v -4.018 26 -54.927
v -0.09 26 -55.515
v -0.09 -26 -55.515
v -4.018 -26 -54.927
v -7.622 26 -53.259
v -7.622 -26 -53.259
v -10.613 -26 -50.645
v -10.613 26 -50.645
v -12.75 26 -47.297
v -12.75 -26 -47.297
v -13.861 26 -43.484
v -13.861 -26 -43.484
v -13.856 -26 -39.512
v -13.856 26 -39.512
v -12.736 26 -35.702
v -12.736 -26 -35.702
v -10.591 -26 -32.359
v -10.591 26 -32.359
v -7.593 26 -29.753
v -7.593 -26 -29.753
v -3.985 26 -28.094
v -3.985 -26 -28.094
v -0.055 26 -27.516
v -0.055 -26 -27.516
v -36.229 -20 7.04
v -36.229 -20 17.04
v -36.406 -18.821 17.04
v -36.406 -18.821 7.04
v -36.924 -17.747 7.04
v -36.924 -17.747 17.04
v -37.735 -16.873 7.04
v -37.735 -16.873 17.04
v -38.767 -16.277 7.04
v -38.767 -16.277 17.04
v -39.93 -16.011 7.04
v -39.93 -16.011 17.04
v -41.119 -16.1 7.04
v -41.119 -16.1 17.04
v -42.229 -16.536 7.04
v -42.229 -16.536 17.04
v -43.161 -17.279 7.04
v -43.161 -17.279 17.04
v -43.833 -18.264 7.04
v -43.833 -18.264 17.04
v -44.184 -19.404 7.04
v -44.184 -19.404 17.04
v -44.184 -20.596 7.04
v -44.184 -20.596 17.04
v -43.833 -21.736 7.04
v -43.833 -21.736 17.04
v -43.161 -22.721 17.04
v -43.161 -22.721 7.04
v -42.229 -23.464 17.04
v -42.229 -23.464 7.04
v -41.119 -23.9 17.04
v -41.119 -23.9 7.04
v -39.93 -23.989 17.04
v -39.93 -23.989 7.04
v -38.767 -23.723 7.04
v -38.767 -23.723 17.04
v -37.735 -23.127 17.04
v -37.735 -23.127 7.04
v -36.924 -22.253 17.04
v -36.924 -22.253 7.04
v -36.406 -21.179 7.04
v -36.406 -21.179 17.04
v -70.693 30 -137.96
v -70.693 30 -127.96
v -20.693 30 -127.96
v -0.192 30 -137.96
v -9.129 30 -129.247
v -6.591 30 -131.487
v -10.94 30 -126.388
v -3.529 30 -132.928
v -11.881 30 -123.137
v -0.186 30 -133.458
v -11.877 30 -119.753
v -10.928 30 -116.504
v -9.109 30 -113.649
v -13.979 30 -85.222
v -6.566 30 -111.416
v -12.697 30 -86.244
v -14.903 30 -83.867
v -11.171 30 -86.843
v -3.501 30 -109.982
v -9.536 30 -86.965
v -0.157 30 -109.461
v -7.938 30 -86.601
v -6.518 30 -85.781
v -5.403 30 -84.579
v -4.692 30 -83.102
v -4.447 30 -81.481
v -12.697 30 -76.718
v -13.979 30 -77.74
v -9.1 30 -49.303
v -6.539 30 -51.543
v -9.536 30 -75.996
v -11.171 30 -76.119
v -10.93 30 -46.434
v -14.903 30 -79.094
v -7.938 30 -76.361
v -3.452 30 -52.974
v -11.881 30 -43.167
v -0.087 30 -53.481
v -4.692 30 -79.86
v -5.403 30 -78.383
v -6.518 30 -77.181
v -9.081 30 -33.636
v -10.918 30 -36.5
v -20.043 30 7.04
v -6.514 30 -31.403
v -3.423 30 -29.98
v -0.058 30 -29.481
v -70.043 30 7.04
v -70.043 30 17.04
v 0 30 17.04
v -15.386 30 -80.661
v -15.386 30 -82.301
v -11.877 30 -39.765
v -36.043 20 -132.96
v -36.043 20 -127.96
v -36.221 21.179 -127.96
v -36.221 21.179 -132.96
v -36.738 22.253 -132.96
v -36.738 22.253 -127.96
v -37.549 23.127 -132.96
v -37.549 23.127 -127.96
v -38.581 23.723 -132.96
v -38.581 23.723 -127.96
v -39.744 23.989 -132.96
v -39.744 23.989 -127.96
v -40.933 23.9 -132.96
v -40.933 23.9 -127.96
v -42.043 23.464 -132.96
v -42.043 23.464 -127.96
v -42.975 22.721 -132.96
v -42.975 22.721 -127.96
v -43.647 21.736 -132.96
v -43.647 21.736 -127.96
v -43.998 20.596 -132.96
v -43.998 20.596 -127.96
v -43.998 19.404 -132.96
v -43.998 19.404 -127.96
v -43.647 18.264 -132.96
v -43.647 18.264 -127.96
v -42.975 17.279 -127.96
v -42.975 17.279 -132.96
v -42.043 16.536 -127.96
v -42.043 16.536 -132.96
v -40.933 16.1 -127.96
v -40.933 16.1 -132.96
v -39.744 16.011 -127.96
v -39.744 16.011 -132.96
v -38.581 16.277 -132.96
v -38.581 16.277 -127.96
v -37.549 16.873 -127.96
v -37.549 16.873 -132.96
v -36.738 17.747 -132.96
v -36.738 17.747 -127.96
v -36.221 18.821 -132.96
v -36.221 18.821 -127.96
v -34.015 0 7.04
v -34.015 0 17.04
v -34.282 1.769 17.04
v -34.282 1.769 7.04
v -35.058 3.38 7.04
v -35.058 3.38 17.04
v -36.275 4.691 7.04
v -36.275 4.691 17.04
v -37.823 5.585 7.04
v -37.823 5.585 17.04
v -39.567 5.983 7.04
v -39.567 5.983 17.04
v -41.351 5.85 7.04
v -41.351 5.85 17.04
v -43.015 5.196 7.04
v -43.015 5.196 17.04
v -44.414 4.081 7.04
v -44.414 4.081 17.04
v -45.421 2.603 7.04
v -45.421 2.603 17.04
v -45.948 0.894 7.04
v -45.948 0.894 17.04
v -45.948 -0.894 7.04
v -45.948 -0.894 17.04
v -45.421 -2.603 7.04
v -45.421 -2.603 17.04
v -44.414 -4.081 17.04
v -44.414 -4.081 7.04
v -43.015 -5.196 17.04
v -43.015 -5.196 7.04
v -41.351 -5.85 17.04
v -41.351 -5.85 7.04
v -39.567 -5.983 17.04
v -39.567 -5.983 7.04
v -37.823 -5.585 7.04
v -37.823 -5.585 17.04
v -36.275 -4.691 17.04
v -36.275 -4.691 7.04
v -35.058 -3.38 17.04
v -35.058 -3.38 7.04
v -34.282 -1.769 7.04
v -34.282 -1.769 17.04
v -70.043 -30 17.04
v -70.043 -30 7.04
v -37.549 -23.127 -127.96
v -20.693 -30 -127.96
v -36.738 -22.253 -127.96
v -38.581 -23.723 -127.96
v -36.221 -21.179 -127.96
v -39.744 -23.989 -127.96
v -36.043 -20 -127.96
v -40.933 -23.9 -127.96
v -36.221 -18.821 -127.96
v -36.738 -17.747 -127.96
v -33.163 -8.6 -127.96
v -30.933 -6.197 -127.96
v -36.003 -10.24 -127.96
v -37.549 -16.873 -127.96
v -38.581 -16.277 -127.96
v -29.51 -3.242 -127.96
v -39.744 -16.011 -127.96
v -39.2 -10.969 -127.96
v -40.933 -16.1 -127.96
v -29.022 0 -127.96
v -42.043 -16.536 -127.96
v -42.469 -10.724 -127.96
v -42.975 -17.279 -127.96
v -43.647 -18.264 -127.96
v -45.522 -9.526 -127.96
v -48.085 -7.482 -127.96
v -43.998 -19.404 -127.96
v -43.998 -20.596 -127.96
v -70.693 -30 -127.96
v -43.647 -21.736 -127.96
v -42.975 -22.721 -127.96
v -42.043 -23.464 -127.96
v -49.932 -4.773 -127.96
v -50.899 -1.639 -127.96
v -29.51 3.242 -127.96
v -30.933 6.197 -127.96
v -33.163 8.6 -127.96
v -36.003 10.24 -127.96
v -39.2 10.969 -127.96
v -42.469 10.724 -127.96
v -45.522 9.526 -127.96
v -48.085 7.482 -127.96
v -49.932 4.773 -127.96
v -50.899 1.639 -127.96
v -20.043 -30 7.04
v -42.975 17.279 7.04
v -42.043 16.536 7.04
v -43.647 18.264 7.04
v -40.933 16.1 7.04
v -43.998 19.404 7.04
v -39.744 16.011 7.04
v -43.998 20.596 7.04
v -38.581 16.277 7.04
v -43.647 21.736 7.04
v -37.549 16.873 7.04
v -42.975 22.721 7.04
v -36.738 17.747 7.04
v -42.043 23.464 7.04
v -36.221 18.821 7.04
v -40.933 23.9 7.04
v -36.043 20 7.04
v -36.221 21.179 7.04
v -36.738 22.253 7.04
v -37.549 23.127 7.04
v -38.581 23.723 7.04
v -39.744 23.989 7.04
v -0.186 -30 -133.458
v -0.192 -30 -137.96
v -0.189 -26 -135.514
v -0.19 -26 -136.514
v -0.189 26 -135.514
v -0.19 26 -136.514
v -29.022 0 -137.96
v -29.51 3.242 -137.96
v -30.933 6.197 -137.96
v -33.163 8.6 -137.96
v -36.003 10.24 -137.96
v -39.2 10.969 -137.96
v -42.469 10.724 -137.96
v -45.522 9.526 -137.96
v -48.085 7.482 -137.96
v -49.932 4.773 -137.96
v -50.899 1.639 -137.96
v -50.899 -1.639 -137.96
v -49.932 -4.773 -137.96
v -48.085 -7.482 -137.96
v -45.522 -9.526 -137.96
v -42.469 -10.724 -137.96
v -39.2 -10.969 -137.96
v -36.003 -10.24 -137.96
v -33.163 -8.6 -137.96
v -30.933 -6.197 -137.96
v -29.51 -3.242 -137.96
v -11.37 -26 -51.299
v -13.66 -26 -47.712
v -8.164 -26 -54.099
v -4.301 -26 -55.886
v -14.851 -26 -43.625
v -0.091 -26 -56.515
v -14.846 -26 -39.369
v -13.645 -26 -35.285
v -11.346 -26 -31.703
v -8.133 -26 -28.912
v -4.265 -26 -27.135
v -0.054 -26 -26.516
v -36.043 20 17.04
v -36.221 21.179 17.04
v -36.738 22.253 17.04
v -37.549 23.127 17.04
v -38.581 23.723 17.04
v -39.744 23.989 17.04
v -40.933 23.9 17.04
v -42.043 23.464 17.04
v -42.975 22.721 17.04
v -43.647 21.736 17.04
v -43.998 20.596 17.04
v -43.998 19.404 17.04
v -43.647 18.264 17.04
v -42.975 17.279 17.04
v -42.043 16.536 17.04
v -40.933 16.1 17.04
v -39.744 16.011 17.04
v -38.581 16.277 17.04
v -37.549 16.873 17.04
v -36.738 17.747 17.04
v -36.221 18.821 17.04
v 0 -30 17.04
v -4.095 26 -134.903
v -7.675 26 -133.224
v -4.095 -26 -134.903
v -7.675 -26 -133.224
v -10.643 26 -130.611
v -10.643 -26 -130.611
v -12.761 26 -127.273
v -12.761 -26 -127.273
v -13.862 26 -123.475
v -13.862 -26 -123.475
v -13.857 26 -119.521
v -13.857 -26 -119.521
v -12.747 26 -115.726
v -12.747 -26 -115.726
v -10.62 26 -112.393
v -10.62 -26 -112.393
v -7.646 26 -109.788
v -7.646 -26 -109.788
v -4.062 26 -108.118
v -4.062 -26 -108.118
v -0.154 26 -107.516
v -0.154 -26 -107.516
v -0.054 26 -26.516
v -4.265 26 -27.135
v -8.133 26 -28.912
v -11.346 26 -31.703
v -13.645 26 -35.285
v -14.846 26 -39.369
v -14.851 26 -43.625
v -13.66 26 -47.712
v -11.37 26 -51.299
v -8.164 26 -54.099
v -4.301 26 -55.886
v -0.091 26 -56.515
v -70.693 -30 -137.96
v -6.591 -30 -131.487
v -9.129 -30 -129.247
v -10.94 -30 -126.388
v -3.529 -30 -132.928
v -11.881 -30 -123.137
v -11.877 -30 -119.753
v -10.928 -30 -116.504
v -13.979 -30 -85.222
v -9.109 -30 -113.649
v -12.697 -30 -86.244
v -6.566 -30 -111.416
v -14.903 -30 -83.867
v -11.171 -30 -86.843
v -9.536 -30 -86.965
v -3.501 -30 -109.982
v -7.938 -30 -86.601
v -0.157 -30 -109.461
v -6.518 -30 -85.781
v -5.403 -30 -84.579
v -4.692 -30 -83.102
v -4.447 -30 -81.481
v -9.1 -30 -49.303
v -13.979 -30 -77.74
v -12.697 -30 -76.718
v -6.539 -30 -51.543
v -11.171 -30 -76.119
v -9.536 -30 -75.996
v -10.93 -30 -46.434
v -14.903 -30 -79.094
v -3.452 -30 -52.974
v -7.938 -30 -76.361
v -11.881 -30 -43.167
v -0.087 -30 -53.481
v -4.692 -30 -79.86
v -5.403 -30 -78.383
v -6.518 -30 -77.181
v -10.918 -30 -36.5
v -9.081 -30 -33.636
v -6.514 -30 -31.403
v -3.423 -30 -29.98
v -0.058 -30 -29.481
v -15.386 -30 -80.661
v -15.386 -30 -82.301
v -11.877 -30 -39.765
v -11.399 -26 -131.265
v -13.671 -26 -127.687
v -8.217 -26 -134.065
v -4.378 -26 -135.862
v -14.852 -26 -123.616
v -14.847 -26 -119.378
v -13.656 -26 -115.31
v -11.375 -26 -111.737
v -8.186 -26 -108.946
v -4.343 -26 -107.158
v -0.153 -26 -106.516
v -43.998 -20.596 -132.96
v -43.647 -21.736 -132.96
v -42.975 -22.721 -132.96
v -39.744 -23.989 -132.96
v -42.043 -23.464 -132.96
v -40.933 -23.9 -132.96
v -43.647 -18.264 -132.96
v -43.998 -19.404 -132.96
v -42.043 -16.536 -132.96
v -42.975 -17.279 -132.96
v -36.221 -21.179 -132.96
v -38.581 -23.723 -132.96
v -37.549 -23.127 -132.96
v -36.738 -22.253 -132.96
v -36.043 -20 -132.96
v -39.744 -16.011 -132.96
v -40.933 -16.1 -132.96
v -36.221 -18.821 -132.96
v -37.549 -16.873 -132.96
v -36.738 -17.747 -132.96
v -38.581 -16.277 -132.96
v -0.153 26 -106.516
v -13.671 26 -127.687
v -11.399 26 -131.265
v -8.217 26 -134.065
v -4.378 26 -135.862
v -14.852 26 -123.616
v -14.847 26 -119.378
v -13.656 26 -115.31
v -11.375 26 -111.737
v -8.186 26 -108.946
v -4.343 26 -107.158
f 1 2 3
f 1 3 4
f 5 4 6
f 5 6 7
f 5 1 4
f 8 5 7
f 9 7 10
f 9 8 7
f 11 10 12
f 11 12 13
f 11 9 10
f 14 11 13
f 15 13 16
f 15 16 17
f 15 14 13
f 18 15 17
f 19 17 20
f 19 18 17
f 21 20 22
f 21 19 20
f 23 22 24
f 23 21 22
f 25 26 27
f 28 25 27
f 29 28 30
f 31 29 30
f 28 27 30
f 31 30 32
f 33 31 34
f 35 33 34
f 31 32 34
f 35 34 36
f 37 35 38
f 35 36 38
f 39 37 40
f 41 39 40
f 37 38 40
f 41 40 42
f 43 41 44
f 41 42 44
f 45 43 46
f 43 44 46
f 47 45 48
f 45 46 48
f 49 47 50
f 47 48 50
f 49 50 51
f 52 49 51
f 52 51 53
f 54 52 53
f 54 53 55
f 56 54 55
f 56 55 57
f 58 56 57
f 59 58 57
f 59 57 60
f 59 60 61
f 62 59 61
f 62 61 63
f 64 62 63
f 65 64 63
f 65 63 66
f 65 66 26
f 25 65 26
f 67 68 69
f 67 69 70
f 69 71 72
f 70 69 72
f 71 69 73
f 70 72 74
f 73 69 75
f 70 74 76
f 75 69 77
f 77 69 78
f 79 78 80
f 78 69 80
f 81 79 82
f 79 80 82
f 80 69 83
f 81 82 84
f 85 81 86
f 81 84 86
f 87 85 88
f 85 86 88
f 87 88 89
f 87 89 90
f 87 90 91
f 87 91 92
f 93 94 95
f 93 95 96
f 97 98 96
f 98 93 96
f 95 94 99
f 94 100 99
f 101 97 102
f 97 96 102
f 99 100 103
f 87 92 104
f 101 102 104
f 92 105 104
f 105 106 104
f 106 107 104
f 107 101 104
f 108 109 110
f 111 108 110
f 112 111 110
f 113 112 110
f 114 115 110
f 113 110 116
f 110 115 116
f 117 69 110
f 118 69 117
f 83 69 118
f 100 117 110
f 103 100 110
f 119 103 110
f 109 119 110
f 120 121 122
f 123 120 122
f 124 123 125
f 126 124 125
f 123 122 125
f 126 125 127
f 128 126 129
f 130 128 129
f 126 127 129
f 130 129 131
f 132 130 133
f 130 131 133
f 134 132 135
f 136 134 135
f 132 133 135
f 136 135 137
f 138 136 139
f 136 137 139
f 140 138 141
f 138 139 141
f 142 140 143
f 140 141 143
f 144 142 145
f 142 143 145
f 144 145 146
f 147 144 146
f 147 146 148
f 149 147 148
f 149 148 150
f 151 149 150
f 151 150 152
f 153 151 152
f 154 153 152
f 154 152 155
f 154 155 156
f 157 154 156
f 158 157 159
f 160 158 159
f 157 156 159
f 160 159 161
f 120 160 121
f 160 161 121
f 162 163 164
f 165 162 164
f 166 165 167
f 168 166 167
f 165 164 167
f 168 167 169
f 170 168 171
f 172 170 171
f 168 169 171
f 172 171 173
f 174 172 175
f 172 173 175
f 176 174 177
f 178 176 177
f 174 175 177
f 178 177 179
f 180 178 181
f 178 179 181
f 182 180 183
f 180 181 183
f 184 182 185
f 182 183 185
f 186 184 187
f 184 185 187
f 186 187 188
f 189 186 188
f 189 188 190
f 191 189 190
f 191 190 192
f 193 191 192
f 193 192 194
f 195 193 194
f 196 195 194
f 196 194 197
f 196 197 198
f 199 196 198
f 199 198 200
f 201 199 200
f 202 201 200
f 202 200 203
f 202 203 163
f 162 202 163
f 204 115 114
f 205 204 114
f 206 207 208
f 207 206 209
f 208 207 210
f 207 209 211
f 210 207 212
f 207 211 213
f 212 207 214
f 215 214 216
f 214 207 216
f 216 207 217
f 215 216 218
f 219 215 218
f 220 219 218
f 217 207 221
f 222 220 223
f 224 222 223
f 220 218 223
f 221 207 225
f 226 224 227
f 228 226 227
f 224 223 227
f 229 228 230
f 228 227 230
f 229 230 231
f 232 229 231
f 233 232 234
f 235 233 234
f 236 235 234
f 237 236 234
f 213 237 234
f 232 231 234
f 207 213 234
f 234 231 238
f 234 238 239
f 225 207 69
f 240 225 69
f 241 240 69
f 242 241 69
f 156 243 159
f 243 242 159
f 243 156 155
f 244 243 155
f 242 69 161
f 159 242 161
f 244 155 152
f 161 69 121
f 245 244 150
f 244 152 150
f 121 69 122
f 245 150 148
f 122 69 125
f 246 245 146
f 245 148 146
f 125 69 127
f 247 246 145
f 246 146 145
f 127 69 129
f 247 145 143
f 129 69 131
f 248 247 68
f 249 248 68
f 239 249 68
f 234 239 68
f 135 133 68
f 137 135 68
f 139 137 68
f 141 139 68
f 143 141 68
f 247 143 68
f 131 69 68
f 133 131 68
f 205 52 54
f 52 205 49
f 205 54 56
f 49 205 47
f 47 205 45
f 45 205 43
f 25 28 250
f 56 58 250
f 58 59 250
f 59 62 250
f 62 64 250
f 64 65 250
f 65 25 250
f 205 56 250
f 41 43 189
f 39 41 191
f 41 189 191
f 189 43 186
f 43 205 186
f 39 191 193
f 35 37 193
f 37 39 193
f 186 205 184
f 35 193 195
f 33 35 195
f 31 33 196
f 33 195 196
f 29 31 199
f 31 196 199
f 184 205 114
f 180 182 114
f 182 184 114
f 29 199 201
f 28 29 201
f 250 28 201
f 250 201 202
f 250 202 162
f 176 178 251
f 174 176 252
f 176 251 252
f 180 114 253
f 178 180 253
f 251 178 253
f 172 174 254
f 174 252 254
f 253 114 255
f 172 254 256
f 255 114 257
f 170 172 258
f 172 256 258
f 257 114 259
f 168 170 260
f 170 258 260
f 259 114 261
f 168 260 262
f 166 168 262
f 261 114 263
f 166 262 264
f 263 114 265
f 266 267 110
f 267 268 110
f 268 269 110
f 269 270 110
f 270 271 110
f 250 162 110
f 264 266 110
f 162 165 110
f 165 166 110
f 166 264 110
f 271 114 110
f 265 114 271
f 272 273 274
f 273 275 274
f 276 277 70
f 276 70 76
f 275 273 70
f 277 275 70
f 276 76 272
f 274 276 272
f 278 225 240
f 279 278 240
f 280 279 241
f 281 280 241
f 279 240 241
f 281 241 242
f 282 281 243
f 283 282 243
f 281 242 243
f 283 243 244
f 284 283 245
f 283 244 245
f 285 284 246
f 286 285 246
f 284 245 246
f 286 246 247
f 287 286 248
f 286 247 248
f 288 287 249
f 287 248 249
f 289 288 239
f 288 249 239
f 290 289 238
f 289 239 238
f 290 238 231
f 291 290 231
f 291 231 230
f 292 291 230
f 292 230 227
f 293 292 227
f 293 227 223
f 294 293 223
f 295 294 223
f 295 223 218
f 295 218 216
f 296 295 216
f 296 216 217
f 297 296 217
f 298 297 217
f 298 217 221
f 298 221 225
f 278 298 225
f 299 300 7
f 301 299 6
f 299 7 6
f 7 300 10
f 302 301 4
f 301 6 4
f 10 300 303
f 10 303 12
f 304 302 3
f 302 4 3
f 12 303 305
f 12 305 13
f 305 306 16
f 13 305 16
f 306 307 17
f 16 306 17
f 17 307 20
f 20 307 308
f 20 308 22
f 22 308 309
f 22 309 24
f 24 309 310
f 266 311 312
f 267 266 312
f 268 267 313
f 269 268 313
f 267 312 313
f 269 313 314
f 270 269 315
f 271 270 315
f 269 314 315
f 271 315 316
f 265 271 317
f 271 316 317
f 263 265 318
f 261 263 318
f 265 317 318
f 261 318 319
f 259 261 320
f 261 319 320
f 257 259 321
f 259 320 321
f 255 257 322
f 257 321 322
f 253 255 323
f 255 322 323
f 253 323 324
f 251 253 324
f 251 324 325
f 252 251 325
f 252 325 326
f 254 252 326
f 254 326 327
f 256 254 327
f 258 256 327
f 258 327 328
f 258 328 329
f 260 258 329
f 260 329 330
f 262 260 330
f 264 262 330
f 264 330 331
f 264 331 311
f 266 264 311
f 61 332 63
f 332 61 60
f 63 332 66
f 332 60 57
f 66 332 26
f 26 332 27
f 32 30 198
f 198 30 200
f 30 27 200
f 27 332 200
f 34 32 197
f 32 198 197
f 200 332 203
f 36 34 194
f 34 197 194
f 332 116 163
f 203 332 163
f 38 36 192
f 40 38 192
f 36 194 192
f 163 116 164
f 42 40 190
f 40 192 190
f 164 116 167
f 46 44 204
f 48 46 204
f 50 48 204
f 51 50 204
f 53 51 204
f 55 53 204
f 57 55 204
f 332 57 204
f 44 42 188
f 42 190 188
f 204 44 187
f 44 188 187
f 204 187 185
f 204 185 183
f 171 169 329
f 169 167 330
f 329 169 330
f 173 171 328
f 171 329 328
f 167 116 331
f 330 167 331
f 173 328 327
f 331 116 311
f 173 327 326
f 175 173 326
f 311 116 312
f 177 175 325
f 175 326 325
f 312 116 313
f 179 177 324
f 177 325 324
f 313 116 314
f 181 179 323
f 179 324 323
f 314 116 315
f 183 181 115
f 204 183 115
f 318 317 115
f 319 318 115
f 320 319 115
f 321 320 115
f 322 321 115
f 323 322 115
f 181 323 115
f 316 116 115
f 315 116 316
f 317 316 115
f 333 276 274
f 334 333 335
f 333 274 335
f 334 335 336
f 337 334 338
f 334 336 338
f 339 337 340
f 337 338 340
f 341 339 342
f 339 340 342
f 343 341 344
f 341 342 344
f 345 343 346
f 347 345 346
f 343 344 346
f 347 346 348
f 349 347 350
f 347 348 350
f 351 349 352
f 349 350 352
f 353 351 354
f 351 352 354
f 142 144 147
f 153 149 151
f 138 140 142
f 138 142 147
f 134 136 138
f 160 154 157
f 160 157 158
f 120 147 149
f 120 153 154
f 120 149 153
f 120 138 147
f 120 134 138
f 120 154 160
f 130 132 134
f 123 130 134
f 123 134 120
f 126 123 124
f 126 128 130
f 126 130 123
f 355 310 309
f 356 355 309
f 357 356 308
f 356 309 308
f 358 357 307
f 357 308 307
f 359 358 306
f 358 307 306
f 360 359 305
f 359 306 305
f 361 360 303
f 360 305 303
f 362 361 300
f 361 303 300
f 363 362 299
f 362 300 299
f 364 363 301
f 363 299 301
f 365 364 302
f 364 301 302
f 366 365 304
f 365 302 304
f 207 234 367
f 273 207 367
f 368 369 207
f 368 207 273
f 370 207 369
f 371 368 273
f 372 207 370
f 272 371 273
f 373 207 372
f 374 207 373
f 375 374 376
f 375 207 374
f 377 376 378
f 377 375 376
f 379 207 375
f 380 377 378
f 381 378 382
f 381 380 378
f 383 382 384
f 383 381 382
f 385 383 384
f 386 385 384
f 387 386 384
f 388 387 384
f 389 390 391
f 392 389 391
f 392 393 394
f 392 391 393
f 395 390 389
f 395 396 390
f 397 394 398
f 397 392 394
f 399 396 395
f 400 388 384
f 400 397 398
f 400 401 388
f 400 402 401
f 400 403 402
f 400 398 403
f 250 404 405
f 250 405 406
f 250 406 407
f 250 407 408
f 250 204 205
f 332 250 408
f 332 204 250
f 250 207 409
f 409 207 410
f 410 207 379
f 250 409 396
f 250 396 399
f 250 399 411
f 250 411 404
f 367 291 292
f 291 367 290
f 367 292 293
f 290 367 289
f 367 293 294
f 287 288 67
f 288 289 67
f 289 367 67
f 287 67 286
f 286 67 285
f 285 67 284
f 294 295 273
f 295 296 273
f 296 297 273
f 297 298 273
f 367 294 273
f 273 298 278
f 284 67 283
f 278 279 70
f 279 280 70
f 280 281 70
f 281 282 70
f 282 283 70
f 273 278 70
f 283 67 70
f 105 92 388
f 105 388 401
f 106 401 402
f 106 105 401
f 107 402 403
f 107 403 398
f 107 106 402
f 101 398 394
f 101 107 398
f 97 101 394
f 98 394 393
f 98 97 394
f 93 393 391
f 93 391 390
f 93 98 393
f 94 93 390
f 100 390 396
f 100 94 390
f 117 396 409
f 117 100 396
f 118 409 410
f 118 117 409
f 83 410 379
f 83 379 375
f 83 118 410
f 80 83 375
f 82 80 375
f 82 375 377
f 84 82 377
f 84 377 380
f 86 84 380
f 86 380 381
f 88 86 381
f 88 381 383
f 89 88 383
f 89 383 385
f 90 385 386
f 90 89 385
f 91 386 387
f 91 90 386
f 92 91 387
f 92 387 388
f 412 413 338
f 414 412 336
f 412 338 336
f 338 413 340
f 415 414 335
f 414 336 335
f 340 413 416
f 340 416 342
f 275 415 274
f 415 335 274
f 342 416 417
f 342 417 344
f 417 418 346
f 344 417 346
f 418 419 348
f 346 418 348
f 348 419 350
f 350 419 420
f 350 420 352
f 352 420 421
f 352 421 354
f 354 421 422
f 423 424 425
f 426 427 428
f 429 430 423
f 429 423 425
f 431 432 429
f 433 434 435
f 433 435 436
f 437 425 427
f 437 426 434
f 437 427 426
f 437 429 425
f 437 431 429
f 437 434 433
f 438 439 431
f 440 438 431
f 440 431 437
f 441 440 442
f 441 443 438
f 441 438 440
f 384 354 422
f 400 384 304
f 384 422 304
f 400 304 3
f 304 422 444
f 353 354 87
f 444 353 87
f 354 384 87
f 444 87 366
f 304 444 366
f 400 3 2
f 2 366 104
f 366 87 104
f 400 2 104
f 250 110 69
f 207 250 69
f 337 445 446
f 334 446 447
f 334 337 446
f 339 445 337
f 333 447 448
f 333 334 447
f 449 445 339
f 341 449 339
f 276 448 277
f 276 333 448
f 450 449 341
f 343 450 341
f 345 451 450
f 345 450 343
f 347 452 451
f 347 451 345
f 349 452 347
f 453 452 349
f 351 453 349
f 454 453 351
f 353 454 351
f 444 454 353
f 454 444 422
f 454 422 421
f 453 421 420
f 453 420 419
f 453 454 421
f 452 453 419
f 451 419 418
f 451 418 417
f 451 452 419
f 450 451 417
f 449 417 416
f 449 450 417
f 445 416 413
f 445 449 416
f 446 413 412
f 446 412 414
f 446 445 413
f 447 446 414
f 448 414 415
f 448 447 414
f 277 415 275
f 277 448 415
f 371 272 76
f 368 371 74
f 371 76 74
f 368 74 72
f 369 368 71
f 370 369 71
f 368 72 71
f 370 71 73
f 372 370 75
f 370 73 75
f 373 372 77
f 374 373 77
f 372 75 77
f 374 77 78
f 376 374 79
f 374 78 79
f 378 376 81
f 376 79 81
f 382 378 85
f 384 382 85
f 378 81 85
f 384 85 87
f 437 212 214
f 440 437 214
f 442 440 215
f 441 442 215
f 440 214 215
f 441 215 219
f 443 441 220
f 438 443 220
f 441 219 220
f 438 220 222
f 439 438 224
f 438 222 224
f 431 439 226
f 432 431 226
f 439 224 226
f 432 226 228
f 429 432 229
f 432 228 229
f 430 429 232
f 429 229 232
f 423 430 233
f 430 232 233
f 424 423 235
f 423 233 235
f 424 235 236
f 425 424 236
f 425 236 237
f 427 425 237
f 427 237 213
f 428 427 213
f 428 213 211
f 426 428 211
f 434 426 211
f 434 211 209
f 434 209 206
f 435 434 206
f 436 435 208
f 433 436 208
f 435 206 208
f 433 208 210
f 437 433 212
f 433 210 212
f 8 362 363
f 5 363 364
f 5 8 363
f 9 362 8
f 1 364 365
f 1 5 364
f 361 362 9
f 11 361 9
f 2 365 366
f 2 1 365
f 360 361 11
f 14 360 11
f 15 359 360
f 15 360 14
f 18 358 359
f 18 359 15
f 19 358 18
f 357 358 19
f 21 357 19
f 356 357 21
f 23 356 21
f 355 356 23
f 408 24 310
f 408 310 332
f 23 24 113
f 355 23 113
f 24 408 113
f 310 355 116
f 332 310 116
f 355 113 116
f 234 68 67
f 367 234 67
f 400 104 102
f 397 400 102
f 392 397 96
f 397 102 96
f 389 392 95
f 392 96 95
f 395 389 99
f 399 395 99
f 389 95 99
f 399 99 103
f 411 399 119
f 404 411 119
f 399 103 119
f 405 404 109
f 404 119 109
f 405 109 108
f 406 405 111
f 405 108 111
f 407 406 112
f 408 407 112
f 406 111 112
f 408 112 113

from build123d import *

# Parameters (mm, degrees)
F0_R          = 5.5
F1_DEPTH      = 60
F4_DEPTH      = 26
F4_DEPTH_BACK = 26
F5_R          = 4
F6_DEPTH      = 5
F7_R          = 4
F8_DEPTH      = 15
F9_R          = 11
F10_DEPTH     = 10.001
F11_R         = 6
F12_DEPTH     = 25


# Not quite as in the source:
# - a feature names something its author has since deleted; it is built from what else it names


with BuildPart() as f1:
    # F0 (on Front) → F1 (new body)
    with BuildSketch(Plane.XZ):
        with BuildLine():
            ThreePointArc((-0.0872969156, -53.4805140133), (-11.9999962709, -41.4659778258), (-0.0575900904, -29.4809696761))
            Line((-0.0575900904, -29.4809696761), (-5.4639e-06, 17.0404876904))
            Line((-5.4639e-06, 17.0404876904), (-70.0428405992, 17.0404876904))
            Line((-70.0428405992, 17.0404876904), (-70.0428405992, 7.0404876904))
            Line((-70.0428405992, 7.0404876904), (-20.0428405992, 7.0404876904))
            Line((-20.0428405992, 7.0404876904), (-20.6929361639, -127.9595123096))
            Line((-20.6929361639, -127.9595123096), (-70.6929361639, -127.9595123096))
            Line((-70.6929361639, -127.9595123096), (-70.6929361639, -137.9595123096))
            Line((-70.6929361639, -137.9595123096), (-0.1918656855, -137.9595123096))
            Line((-0.1918656855, -137.9595123096), (-0.1862936956, -133.4580141387))
            ThreePointArc((-0.1862936956, -133.4580141387), (-11.9988136294, -121.4446249335), (-0.1565894029, -109.4605157571))
            Line((-0.1565894029, -109.4605157571), (-0.0872969156, -53.4805140133))
        make_face()
        with Locations((-9.947382845, -81.480831509)):
            Circle(F0_R, mode=Mode.SUBTRACT)
    extrude(amount=F1_DEPTH)


with BuildPart() as f1_1:
    # F2: moved
    add(f1.part.moved(Location((0, 30, 0))))

    # F3 (on Front) → F4 (cut, two sides)
    with BuildSketch(Plane.XZ) as f4_sk:
        with BuildLine():
            ThreePointArc((0, -55.5154254436), (-14, -41.5154254436), (0, -27.5154254436))
            Line((0, -27.5154254436), (0, -26.5154254436))
            ThreePointArc((0, -26.5154254436), (-15, -41.5154254436), (0, -56.5154254436))
            Line((0, -56.5154254436), (0, -55.5154254436))
        make_face()
        with BuildLine():
            Line((0, -107.5154236555), (0, -106.5154236555))
            ThreePointArc((0, -106.5154236555), (-15, -121.5154236555), (0, -136.5154236555))
            Line((0, -136.5154236555), (0, -135.5154236555))
            ThreePointArc((0, -135.5154236555), (-14, -121.5154236555), (0, -107.5154236555))
        make_face()
    extrude(amount=F4_DEPTH, mode=Mode.SUBTRACT)
    extrude(f4_sk.sketch, amount=-F4_DEPTH_BACK, mode=Mode.SUBTRACT)

    # F5 (on face) → F6 (cut)
    with BuildSketch(Plane.XY.offset(-127.9595123096)):
        with Locations((-40.0428405992, -20)):
            Circle(F5_R)
        with Locations((-40.0428405992, 20)):
            Circle(F5_R)
    extrude(amount=-F6_DEPTH, mode=Mode.SUBTRACT)

    # F7 (on face) → F8 (cut)
    with BuildSketch(Plane.XY.offset(17.0404876904)):
        with Locations((-40.0428405992, 20)):
            Circle(F7_R)
        with Locations((-40.2286797762, -20)):
            Circle(F7_R)
    extrude(amount=-F8_DEPTH, mode=Mode.SUBTRACT)

    # F9 (on face) → F10 (cut, through all)
    with BuildSketch(Plane.XY.offset(-127.9595123096)):
        with Locations((-40.0215312839, 0)):
            Circle(F9_R)
    extrude(amount=-F10_DEPTH, mode=Mode.SUBTRACT)

    # F11 (on face) → F12 (cut)
    with BuildSketch(Plane.XY.offset(17.0404876904)):
        with Locations((-40.0154478848, 0)):
            Circle(F11_R)
    extrude(amount=-F12_DEPTH, mode=Mode.SUBTRACT)


solid = f1_1.part
